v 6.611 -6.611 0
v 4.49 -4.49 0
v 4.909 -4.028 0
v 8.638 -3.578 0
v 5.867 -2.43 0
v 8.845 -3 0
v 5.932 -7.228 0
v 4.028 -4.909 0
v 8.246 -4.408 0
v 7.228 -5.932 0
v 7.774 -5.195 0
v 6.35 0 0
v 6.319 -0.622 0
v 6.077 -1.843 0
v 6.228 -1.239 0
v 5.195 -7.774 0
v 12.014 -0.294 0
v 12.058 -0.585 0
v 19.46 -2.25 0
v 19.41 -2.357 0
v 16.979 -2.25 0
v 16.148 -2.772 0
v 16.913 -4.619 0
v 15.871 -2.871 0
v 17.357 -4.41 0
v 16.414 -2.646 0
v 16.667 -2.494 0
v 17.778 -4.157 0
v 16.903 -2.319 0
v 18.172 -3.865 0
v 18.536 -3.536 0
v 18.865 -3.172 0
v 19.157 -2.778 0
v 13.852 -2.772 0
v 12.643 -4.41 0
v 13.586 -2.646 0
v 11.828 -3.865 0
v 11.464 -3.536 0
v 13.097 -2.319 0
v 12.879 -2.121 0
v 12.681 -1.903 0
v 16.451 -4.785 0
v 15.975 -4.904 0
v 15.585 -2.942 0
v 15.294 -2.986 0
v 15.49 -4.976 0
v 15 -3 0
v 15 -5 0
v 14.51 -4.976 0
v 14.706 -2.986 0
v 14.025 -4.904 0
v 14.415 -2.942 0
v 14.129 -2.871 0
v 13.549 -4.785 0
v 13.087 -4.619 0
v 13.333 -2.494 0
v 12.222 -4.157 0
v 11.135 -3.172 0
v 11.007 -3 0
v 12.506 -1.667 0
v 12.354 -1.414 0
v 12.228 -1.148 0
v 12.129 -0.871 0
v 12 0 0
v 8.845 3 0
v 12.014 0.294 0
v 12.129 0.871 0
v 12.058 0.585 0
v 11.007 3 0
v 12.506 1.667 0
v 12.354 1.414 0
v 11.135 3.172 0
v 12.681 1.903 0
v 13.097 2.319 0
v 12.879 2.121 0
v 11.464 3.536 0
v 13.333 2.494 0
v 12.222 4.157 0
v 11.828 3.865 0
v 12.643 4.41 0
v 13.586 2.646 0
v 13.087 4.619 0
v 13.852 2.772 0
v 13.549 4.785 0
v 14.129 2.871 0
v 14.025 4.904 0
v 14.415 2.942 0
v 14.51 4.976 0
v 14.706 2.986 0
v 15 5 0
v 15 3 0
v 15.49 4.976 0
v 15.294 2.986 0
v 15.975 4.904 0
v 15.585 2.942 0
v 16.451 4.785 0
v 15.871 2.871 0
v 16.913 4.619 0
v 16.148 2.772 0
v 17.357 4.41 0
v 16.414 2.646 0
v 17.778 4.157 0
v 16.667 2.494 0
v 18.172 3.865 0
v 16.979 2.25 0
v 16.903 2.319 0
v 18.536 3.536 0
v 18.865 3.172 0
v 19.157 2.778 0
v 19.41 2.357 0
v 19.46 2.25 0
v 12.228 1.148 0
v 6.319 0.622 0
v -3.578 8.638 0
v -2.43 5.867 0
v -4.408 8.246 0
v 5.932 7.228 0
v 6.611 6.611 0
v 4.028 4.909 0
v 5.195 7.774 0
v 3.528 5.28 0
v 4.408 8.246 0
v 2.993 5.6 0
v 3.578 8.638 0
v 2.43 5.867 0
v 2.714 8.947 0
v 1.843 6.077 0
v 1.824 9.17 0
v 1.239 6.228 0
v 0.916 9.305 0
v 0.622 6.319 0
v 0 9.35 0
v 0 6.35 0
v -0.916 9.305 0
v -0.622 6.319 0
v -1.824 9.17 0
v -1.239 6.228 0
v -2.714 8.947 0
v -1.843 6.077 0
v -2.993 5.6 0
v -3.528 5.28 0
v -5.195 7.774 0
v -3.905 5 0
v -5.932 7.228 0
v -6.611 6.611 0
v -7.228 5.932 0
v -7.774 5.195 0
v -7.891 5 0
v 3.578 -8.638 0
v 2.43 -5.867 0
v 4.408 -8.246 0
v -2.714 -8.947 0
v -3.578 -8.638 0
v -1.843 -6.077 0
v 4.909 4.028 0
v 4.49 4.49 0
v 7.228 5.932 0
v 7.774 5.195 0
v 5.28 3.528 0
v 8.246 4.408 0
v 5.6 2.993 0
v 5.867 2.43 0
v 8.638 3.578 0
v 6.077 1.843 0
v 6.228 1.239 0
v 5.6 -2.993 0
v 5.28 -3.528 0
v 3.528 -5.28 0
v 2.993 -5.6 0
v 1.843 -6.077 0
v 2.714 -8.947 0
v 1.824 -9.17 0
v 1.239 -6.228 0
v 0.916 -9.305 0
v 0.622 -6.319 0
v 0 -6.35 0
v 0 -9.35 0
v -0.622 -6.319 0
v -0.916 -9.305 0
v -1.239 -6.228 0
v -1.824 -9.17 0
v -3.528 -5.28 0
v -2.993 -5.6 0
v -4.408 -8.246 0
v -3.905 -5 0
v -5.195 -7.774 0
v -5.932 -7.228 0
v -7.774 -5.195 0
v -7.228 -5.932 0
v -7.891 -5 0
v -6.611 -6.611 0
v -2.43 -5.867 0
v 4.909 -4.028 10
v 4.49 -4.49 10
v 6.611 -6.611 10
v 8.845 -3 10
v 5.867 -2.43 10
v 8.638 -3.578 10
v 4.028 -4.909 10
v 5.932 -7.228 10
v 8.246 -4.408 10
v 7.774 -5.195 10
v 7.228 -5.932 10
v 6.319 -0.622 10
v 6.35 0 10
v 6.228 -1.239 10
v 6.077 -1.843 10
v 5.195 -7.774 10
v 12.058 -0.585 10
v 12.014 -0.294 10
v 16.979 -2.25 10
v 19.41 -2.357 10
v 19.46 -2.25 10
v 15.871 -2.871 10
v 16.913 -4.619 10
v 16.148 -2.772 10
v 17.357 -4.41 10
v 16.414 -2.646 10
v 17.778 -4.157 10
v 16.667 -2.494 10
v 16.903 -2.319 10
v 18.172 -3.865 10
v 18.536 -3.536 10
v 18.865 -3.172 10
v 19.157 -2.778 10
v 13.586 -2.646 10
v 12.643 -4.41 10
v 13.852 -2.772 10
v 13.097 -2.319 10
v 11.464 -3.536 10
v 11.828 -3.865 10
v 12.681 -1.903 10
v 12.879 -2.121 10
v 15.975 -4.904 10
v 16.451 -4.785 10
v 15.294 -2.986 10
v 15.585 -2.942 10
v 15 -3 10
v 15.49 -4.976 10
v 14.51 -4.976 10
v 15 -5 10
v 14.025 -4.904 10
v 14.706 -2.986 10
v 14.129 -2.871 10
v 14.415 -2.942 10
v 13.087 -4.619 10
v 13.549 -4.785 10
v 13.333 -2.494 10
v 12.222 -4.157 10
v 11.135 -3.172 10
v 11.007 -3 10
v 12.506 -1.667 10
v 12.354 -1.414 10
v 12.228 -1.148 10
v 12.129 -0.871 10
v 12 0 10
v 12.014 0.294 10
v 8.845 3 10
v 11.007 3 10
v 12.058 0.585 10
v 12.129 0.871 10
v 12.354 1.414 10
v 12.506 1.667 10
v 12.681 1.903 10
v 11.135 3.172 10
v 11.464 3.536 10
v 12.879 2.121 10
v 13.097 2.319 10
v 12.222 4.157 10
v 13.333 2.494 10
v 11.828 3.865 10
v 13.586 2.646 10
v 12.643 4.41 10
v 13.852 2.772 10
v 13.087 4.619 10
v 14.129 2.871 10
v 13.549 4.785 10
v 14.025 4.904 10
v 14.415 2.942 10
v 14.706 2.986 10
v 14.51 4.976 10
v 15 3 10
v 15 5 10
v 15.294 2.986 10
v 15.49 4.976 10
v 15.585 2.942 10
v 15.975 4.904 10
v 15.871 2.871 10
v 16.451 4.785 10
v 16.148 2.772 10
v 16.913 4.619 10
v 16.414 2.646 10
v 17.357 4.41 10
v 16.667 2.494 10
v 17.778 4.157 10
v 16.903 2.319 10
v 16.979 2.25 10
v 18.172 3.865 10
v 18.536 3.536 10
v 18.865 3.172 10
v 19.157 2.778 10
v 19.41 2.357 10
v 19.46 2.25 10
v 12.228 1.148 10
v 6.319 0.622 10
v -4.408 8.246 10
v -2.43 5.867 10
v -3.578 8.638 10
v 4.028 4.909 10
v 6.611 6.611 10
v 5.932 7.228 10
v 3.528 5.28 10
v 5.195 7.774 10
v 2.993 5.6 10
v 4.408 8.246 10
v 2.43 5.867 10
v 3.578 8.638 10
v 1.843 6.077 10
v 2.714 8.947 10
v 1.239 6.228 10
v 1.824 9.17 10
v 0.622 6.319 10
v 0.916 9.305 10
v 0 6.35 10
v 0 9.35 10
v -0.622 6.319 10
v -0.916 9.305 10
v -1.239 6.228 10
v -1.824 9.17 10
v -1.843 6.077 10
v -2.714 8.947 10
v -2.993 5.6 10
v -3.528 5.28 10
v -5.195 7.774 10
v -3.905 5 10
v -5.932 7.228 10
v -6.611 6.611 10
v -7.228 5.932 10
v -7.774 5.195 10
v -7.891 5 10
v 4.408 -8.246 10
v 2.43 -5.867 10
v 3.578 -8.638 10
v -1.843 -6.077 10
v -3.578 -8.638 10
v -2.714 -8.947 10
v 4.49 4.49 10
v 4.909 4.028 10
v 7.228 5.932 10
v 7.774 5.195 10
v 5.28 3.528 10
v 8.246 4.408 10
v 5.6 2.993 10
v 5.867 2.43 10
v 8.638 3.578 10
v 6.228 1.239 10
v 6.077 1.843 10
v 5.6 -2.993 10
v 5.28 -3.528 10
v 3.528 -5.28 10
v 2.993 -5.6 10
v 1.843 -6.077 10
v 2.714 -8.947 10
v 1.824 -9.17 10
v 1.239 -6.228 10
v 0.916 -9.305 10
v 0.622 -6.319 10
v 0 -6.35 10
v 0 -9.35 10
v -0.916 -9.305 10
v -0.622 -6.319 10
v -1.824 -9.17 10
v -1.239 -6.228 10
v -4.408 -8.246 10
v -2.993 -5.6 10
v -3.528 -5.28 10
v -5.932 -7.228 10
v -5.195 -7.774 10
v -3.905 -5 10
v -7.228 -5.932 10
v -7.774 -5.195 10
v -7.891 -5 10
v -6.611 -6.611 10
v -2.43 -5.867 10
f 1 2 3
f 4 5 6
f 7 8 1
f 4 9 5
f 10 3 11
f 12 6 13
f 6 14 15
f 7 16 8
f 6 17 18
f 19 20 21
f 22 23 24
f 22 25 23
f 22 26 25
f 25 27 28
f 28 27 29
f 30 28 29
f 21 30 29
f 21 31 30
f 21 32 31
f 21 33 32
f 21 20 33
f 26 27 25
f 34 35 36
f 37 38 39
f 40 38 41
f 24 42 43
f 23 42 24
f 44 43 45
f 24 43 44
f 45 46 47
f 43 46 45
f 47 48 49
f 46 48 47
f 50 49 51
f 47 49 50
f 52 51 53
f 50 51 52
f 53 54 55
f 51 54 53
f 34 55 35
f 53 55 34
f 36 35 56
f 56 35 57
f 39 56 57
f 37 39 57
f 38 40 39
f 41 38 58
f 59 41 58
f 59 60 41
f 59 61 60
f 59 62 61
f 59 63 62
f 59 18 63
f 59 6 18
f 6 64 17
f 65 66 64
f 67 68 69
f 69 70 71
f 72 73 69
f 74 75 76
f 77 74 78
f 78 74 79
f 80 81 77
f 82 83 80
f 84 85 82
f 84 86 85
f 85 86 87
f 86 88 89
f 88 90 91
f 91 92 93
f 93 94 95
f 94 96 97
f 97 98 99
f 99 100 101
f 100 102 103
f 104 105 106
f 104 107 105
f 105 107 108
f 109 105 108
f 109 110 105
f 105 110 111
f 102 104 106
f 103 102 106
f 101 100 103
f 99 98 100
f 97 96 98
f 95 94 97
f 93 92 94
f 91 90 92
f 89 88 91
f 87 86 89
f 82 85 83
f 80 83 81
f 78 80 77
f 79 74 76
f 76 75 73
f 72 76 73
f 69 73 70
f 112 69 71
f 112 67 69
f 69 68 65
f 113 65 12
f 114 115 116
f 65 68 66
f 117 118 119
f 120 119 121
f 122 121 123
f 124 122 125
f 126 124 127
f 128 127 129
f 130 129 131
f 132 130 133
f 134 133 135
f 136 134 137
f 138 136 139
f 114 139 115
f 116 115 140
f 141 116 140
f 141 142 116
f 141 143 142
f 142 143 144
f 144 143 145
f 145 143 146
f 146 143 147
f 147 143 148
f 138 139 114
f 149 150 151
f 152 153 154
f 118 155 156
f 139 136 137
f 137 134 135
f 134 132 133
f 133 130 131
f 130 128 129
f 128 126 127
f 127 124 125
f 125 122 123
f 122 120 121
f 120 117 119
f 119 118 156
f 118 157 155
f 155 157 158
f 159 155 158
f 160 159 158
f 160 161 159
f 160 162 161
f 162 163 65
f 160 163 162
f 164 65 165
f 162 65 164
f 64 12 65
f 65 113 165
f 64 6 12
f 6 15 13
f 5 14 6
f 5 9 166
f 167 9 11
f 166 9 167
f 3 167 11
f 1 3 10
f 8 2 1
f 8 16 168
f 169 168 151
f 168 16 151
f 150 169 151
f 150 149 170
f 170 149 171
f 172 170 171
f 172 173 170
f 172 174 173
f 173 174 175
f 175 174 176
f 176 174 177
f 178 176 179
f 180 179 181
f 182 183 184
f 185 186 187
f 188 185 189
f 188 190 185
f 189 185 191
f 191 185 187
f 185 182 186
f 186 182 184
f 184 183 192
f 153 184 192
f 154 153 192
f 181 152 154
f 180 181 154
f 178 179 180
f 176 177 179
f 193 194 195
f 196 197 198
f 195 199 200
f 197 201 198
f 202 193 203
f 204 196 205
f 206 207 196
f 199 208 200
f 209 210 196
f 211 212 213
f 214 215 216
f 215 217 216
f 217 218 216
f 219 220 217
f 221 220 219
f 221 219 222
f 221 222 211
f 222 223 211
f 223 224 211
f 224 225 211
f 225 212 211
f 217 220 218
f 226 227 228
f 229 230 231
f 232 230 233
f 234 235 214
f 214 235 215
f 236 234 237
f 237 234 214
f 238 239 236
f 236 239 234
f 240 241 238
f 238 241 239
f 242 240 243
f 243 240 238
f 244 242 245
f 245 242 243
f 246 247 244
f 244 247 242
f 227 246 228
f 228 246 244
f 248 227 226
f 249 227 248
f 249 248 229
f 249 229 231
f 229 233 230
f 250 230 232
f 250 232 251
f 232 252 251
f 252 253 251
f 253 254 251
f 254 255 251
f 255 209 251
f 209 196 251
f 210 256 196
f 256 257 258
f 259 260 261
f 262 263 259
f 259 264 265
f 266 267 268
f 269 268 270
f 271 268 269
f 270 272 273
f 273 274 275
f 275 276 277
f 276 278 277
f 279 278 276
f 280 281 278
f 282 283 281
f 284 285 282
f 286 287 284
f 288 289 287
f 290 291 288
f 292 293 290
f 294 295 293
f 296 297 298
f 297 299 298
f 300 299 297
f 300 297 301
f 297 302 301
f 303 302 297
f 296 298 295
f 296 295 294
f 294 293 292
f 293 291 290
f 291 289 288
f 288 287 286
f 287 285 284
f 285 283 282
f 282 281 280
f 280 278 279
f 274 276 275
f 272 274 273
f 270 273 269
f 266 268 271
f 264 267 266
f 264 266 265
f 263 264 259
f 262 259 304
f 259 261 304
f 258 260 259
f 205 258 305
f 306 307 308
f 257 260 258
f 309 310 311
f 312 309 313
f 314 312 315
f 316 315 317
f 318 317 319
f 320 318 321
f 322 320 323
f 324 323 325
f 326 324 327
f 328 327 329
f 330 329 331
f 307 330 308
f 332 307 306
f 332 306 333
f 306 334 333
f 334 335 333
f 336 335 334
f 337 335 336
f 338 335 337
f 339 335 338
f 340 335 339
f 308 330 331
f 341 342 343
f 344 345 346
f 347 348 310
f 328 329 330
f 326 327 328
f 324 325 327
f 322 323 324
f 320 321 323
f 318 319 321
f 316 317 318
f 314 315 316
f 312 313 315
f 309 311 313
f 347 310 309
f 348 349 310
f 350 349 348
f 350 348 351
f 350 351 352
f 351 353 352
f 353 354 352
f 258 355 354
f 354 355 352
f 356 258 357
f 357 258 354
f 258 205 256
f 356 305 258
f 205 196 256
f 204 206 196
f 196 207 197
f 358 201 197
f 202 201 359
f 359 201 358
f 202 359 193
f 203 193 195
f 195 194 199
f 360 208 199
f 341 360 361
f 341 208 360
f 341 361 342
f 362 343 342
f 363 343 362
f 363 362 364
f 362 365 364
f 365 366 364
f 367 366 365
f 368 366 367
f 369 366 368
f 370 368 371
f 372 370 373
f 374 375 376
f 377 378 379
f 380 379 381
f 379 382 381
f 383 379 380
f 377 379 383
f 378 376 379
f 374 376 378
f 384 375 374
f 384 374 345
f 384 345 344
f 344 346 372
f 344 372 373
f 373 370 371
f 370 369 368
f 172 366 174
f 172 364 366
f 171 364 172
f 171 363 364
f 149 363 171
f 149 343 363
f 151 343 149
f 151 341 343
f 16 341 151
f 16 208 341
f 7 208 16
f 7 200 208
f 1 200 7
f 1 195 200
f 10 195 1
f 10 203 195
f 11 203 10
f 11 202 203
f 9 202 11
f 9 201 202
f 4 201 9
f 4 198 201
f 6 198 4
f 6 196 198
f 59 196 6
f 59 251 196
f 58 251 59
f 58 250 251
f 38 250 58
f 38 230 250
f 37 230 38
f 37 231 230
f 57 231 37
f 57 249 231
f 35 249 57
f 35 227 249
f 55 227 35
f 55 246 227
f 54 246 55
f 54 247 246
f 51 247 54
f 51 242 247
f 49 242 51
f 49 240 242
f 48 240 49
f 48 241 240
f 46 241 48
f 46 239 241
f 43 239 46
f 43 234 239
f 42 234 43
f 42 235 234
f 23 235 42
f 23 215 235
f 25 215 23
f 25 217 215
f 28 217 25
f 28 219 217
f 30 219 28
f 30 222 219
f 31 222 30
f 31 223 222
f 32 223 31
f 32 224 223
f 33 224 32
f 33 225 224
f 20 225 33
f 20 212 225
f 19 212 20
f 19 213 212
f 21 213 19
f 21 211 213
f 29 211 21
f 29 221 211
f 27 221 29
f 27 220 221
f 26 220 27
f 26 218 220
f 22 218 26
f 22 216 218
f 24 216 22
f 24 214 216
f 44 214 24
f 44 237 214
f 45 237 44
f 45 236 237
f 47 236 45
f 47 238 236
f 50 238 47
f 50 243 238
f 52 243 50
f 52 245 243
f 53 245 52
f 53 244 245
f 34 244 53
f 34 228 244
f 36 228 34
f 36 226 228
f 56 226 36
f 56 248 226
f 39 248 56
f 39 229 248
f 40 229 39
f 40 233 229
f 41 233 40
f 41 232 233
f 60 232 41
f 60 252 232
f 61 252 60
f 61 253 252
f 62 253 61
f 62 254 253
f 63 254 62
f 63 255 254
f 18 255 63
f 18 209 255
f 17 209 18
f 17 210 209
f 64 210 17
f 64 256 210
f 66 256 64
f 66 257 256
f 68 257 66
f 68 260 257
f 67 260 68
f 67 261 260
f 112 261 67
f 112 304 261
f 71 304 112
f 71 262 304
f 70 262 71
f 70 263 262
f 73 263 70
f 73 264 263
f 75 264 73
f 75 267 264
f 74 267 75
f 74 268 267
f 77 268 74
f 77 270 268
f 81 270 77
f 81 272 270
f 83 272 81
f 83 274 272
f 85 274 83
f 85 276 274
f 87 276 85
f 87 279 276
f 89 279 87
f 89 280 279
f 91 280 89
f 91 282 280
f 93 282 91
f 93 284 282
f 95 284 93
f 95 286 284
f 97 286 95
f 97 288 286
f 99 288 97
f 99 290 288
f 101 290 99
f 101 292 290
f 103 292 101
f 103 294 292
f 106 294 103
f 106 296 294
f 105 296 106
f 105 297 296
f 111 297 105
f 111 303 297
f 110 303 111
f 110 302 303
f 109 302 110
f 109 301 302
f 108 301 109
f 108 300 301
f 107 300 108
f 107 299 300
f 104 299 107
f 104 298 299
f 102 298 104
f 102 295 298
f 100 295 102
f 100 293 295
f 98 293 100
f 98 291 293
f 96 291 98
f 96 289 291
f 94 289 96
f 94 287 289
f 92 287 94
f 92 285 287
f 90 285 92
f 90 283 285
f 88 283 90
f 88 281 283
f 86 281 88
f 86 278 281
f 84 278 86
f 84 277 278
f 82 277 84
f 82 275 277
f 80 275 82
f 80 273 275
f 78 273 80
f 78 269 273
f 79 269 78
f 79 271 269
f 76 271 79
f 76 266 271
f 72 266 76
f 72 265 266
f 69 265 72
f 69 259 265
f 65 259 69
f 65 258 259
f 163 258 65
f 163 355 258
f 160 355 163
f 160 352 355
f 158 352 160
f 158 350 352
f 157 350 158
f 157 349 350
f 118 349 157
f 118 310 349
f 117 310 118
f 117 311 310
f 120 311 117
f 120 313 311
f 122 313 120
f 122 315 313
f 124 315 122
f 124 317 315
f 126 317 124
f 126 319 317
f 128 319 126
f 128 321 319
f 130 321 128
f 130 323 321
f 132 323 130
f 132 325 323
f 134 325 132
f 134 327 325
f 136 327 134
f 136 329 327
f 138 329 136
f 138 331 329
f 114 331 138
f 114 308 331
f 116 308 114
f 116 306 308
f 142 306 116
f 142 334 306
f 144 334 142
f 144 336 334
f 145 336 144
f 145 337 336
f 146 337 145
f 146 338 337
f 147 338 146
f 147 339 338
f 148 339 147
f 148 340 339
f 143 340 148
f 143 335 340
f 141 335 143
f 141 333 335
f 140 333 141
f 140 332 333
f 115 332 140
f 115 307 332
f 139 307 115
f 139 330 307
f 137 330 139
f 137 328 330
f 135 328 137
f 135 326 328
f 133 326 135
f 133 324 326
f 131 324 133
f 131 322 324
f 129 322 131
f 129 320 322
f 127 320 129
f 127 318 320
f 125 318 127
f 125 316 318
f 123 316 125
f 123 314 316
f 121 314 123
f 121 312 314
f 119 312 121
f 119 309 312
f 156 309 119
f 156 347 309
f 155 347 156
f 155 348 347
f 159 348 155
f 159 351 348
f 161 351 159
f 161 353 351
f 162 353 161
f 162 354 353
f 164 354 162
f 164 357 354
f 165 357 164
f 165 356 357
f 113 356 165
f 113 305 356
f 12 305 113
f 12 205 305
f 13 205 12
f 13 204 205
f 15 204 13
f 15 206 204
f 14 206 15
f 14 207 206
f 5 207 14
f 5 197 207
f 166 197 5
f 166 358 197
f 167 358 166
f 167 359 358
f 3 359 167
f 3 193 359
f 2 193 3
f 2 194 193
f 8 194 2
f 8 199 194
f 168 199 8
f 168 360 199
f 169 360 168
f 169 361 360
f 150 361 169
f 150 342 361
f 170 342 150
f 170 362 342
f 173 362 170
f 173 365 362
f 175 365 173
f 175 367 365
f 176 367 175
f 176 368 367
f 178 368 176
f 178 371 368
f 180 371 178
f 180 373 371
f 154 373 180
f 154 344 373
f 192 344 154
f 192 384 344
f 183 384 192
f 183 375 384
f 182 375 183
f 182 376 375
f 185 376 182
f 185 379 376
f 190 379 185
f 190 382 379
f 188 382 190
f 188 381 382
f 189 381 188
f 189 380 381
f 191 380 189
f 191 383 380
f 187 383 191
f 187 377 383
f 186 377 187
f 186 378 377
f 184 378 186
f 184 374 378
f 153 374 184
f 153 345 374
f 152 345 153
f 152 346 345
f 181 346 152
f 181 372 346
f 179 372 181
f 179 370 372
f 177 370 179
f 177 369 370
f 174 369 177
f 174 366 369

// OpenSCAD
// Snap-on clip for 12.7mm lab rod and 6mm tubing
// Corrected version: Uses a single 2D profile extruded to 3D to avoid mixing 2D/3D errors.
// The part is printed flat on the XY plane (Z=0 to Z=10).

// --- Dimensions ---
rod_id      = 12.7;    // Inner diameter of the rod ring
rod_wall    = 3.0;     // Wall thickness of the rod ring
rod_od      = rod_id + 2 * rod_wall; 

rod_gap_w   = 10.0;    // Width of the opening in the rod ring
rod_gap_h   = 10.0;    // Height of the opening in the rod ring

tube_id     = 6.0;     // Inner diameter of the tubing ring
tube_wall   = 2.0;     // Wall thickness of the tubing ring
tube_od     = tube_id + 2 * tube_wall; 

tube_gap_w  = 4.5;     // Width of the opening in the tubing ring
tube_gap_h  = 4.5;     // Height of the opening in the tubing ring

tube_offset_x = 15.0;  // X-coordinate of the tubing ring center
bridge_w_y    = 6.0;   // Width of the bridge in the Y direction
bridge_x_start = 8.0;   // Start of the bridge in X
bridge_x_end   = 12.0;  // End of the bridge in X

extrusion_z = 10.0;    // Total height of the part (Z)

$fn = 64;

// --- Geometry Construction ---

// We define the entire cross-section in 2D first.
// This ensures a single watertight solid and avoids "Mixing 2D and 3D" errors.
module profile_2d() {
    difference() {
        // 1. The Main Body (Union of Rod Ring, Tube Ring, and Bridge)
        union() {
            // Rod Ring Profile
            difference() {
                circle(d = rod_od);
                circle(d = rod_id);
            }
            
            // Tube Ring Profile
            translate([tube_offset_x, 0])
            difference() {
                circle(d = tube_od);
                circle(d = tube_id);
            }
            
            // Bridge Profile
            // Centered on Y, so Y goes from -3 to 3
            translate([bridge_x_start, -bridge_w_y/2])
            square([bridge_x_end - bridge_x_start, bridge_w_y]);
        }
        
        // 2. Subtractions (Gaps)
        
        // Rod gap: everything with x < 0 and -5 < y < 5 is removed
        // We extend the square slightly to ensure a clean cut through the ring
        translate([-rod_od, -5])
        square([rod_od, 10]);
        
        // Tube gap: everything with x > 15 and -2.25 < y < 2.25 is removed
        // We extend the square slightly to ensure a clean cut through the ring
        translate([tube_offset_x, -2.25])
        square([tube_gap_w + 1, 4.5]);
    }
}

// Final Render:
// Extrude the 2D profile to the required height Z.
// This results in a 3D object that sits on the XY plane at Z=0.
linear_extrude(height = extrusion_z) {
    profile_2d();
}
